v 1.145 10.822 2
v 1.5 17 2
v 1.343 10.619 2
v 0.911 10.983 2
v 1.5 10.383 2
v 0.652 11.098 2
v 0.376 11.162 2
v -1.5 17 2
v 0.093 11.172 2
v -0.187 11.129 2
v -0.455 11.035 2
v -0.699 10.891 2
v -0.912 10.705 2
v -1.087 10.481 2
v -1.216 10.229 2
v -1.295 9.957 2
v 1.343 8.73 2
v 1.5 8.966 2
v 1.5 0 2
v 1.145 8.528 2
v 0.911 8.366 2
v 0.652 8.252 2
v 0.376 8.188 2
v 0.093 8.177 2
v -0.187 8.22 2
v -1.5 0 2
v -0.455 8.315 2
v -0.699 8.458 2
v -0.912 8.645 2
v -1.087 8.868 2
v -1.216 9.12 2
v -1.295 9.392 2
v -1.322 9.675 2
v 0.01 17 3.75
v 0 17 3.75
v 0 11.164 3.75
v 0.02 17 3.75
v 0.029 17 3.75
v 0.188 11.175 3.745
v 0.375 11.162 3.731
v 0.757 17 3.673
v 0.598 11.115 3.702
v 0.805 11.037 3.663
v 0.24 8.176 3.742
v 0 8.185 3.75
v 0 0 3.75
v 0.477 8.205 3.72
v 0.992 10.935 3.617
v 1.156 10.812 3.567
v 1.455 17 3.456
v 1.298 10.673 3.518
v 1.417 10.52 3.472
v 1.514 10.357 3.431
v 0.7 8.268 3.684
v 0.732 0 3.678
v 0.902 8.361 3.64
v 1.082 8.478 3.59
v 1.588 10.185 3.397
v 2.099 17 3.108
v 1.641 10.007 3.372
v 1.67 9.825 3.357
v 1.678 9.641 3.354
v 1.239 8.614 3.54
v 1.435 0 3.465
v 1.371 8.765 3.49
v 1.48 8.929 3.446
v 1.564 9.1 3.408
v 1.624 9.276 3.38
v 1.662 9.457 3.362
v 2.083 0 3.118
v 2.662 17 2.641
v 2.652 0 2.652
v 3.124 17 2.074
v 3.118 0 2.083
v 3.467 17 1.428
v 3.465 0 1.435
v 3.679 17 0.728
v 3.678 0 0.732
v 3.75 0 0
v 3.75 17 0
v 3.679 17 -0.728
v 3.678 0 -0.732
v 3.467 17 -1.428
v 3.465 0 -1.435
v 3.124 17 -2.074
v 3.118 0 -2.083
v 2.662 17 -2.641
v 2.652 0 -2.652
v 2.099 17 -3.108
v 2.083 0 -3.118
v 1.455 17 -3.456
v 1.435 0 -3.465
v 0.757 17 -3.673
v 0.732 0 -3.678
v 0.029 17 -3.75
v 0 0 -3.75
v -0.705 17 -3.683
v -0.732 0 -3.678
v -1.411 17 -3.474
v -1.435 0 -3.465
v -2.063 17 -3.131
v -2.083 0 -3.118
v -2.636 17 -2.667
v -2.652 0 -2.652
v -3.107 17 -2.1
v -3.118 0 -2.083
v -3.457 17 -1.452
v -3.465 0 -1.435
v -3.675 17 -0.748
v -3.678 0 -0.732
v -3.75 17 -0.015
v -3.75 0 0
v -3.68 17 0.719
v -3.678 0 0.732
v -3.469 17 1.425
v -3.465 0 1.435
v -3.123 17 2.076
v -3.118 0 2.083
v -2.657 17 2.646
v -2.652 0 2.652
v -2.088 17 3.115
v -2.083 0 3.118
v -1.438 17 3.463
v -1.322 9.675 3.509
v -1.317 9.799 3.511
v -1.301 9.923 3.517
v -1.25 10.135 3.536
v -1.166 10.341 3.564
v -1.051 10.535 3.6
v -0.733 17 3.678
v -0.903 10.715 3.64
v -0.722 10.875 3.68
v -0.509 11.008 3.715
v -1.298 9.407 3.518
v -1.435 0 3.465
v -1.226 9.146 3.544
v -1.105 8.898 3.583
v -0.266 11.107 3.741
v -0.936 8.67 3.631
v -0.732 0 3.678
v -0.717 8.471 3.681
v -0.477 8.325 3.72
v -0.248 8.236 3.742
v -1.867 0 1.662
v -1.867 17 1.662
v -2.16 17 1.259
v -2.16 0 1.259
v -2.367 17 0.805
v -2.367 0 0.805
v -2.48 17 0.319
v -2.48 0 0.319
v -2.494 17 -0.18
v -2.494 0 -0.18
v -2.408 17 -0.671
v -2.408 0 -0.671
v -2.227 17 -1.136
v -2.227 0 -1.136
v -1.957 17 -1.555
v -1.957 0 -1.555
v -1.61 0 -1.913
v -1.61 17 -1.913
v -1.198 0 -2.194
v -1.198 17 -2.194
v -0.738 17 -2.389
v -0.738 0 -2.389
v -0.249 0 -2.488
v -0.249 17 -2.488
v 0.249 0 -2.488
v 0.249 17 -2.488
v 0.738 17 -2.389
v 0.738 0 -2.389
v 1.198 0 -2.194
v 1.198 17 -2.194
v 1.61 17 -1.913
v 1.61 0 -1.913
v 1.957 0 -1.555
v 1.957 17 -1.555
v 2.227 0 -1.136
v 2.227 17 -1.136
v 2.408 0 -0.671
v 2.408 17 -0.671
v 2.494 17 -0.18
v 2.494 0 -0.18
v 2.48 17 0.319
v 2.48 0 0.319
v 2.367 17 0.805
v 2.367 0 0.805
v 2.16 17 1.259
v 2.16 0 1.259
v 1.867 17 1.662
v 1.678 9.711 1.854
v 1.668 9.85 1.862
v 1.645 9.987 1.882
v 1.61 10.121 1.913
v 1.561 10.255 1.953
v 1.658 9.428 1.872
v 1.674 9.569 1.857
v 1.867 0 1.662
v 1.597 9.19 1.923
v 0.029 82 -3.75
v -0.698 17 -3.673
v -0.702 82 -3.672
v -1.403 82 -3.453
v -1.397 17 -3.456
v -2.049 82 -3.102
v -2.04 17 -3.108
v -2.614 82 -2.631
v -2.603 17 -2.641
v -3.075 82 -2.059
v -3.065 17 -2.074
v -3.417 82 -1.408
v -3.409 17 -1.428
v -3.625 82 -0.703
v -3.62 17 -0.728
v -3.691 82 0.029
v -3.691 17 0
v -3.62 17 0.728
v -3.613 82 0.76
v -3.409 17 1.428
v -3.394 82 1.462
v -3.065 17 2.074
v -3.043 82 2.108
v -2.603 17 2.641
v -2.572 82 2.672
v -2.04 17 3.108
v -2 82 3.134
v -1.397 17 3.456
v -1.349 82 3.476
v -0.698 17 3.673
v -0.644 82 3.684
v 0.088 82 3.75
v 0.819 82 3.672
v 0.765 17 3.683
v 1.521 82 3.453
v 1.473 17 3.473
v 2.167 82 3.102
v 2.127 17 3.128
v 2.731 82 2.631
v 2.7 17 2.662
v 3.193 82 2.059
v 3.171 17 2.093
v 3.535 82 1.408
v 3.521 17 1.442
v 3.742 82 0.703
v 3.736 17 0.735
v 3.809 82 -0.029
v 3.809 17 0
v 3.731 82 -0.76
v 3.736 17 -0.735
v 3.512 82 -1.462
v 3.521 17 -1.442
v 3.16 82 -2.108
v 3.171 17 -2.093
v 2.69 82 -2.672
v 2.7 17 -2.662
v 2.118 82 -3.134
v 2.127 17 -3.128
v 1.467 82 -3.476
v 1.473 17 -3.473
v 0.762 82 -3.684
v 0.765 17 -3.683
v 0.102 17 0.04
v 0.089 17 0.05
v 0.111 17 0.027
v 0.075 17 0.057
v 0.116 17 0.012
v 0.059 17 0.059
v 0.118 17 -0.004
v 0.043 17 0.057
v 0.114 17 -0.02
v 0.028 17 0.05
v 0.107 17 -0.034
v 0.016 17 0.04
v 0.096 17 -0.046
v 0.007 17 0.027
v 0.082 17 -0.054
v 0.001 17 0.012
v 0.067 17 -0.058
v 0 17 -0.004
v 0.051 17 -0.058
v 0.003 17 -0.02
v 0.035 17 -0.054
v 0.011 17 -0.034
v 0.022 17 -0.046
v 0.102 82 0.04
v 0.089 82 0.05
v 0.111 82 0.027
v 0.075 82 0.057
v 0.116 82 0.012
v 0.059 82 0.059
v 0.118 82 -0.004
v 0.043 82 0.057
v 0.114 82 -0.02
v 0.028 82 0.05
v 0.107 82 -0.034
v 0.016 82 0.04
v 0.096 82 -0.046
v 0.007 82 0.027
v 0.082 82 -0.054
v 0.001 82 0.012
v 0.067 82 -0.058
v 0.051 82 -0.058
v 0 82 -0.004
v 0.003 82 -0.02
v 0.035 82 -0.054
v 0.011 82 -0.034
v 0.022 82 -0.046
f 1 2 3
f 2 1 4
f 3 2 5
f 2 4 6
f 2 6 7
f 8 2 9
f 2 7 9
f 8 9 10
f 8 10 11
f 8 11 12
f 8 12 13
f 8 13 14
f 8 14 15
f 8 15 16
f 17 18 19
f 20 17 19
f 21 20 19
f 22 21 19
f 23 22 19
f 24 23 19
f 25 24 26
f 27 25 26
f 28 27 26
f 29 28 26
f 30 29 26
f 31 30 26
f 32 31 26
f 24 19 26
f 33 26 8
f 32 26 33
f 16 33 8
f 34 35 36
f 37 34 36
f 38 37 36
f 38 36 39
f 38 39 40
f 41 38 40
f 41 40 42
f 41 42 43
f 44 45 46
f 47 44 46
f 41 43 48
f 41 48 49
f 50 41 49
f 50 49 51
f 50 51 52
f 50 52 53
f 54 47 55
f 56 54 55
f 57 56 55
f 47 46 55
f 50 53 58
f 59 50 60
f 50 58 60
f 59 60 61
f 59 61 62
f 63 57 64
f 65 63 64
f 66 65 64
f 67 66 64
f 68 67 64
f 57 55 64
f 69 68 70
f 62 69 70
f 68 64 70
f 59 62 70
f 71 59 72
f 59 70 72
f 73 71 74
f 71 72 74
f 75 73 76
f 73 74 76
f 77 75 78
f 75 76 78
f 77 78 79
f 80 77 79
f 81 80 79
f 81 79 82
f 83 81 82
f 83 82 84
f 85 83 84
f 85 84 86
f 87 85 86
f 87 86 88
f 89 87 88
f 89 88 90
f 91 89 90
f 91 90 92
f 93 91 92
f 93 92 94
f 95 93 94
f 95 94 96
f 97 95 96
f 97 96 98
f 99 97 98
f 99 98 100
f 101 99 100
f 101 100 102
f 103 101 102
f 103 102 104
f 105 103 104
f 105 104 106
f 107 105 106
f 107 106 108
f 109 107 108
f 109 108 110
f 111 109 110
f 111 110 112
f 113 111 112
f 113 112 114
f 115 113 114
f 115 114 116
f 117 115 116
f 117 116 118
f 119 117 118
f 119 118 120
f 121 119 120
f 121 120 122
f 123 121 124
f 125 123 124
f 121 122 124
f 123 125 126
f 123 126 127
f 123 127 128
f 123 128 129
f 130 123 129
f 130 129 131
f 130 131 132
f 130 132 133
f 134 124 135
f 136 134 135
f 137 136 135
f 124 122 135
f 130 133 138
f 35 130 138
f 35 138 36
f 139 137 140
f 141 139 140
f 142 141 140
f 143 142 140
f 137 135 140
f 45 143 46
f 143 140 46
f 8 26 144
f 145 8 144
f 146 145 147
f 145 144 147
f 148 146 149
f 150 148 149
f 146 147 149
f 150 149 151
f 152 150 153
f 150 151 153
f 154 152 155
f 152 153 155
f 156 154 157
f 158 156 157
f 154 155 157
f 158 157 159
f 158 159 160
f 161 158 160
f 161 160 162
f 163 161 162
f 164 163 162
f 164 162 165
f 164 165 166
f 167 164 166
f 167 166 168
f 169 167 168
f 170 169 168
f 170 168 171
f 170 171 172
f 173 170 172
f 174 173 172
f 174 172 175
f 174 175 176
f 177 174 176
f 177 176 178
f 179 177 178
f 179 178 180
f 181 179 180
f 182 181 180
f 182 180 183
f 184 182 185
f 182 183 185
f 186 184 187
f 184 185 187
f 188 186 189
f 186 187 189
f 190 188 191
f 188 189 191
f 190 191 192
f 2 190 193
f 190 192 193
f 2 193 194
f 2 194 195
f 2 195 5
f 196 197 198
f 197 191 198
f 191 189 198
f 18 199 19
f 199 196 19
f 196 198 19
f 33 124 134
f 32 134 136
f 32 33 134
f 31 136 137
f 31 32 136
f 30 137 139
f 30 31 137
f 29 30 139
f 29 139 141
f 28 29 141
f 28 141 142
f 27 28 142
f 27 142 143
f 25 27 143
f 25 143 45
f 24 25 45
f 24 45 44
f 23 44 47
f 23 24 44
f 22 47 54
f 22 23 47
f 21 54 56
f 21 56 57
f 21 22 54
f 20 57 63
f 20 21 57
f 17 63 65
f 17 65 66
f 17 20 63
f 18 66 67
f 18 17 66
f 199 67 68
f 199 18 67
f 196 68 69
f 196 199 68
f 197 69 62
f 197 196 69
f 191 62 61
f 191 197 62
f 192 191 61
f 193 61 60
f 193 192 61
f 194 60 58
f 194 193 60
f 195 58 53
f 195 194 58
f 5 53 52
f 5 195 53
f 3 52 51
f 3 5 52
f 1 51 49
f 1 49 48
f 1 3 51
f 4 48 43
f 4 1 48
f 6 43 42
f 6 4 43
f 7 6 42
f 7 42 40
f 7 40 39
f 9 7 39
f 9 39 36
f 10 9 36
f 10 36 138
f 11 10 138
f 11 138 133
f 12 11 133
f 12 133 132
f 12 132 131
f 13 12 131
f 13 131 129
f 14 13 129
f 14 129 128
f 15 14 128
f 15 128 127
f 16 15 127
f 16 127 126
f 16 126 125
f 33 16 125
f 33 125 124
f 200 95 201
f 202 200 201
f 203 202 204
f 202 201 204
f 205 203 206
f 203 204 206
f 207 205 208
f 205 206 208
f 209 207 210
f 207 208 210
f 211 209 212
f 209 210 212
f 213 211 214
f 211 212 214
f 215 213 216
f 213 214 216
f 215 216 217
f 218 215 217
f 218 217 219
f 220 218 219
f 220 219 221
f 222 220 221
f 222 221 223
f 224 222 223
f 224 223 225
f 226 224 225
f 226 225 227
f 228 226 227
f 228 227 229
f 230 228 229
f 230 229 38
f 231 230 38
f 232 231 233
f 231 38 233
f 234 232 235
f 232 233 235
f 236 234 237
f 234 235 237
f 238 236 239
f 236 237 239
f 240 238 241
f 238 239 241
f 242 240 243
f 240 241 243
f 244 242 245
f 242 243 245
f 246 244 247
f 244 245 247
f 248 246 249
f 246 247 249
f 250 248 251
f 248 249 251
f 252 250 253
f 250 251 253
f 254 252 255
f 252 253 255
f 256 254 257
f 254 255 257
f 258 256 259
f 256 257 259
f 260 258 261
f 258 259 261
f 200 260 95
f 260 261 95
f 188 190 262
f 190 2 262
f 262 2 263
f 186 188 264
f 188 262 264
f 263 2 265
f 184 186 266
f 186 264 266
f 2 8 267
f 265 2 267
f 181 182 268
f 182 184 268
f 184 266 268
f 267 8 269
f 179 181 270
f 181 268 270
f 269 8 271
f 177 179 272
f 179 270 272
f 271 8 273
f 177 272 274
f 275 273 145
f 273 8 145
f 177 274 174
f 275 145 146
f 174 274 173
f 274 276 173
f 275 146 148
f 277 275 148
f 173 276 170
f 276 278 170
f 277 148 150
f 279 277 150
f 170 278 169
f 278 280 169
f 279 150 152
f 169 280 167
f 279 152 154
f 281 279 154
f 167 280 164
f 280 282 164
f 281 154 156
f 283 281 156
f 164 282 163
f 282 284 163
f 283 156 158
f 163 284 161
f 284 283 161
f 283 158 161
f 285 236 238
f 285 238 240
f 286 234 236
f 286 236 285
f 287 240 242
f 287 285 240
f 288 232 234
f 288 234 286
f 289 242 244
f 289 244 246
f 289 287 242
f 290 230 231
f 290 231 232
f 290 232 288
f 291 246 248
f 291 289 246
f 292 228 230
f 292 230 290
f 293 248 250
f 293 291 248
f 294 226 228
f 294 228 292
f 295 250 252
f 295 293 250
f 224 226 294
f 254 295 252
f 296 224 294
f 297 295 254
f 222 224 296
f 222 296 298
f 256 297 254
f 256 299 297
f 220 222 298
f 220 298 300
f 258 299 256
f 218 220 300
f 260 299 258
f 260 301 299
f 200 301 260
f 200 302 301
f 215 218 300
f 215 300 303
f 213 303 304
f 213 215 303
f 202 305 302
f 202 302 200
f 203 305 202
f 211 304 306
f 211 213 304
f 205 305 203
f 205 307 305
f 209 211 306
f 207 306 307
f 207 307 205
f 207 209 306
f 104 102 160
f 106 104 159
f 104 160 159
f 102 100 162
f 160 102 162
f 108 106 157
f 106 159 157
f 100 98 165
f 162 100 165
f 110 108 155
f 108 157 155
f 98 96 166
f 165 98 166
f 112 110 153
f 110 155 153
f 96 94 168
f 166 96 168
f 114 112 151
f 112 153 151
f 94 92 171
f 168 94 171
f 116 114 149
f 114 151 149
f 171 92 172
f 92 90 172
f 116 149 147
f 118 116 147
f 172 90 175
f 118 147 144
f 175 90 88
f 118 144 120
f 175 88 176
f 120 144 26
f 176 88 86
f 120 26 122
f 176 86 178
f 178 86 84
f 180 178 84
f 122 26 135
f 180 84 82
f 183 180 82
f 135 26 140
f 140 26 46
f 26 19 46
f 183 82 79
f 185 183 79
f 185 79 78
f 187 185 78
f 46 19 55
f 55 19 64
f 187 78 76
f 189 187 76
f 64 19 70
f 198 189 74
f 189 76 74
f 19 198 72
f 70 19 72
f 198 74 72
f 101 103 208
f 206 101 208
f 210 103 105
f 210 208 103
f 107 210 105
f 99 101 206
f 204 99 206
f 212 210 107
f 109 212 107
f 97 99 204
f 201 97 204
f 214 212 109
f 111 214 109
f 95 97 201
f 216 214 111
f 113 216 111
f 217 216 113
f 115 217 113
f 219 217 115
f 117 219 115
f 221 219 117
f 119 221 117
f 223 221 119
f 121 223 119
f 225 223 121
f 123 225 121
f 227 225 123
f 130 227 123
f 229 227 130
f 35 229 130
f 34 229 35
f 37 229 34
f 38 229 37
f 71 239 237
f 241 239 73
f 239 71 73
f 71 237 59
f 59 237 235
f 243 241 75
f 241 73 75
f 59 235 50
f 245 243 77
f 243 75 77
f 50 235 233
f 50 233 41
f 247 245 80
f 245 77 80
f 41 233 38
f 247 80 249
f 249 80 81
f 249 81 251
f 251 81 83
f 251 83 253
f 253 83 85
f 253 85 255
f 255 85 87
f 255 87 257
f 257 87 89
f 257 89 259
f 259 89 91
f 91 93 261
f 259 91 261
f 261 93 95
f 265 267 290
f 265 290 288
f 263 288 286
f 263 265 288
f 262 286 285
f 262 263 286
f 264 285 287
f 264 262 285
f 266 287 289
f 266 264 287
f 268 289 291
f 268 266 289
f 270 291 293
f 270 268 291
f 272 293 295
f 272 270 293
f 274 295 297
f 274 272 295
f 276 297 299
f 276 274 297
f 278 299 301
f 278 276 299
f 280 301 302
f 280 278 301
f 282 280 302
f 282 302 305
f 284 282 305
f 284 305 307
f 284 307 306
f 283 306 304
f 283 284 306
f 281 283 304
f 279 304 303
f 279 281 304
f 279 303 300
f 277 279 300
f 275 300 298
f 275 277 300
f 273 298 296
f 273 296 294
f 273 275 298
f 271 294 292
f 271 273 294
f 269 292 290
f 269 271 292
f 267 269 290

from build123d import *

# Parameters (mm, degrees)
SKETCH1_R               = 3.75
BOSS_EXTRUDE1_DEPTH     = 17
SKETCH2_R               = 3.75
SKETCH2_R_2             = 0.058819456
BOSS_EXTRUDE2_DEPTH     = 65
CUT_EXTRUDE1_REACH      = 84.174
CUT_EXTRUDE1_END_RADIUS = 3.75
SKETCH3_R               = 1.5


with BuildPart() as part:
    # Sketch1 → Boss-Extrude1 (new body)
    with BuildSketch(Plane(origin=(0, 0, 0), x_dir=(1, 0, 0), z_dir=(0, 1, 0))):
        with Locations(Location((0, 0, 0), (0, 0, 270))):
            Circle(SKETCH1_R)
        with BuildLine():
            Line((1.5, -2), (-1.5, -2))
            ThreePointArc((-1.5, -2), (0, 2.5), (1.5, -2))
        make_face(mode=Mode.SUBTRACT)
    extrude(amount=BOSS_EXTRUDE1_DEPTH)

    # Sketch2 → Boss-Extrude2 (add)
    with BuildSketch(Plane(origin=(0, 17, 0), x_dir=(1, 0, 0), z_dir=(0, 1, 0))):
        with Locations(Location((0.058819456, 0, 0), (0, 0, 90.449352147))):
            Circle(SKETCH2_R)
        with Locations(Location((0.058819456, 0, 0), (0, 0, 270))):
            Circle(SKETCH2_R_2, mode=Mode.SUBTRACT)
    extrude(amount=BOSS_EXTRUDE2_DEPTH)

    # Cut-Extrude1: up to this cylinder (the profile starts inside it)
    cut_extrude1_end = Plane(origin=(0, 9.674653, 0), z_dir=(0, -1, 0)) * Cylinder(CUT_EXTRUDE1_END_RADIUS, 176.848, mode=Mode.PRIVATE)
    # Sketch3 → Cut-Extrude1 (cut, up to the surface)
    with BuildSketch(Plane.XY, mode=Mode.PRIVATE) as cut_extrude1_sk1:
        with Locations(Location((0.177976735, 9.674652852, 0), (0, 0, 180))):
            Circle(SKETCH3_R)
    cut_extrude1_tool1 = extrude(cut_extrude1_sk1.sketch, amount=CUT_EXTRUDE1_REACH, mode=Mode.PRIVATE) & cut_extrude1_end
    add(cut_extrude1_tool1.solids().sort_by_distance((0.177977, 9.674653, 0))[0], mode=Mode.SUBTRACT)


solid = part.part
